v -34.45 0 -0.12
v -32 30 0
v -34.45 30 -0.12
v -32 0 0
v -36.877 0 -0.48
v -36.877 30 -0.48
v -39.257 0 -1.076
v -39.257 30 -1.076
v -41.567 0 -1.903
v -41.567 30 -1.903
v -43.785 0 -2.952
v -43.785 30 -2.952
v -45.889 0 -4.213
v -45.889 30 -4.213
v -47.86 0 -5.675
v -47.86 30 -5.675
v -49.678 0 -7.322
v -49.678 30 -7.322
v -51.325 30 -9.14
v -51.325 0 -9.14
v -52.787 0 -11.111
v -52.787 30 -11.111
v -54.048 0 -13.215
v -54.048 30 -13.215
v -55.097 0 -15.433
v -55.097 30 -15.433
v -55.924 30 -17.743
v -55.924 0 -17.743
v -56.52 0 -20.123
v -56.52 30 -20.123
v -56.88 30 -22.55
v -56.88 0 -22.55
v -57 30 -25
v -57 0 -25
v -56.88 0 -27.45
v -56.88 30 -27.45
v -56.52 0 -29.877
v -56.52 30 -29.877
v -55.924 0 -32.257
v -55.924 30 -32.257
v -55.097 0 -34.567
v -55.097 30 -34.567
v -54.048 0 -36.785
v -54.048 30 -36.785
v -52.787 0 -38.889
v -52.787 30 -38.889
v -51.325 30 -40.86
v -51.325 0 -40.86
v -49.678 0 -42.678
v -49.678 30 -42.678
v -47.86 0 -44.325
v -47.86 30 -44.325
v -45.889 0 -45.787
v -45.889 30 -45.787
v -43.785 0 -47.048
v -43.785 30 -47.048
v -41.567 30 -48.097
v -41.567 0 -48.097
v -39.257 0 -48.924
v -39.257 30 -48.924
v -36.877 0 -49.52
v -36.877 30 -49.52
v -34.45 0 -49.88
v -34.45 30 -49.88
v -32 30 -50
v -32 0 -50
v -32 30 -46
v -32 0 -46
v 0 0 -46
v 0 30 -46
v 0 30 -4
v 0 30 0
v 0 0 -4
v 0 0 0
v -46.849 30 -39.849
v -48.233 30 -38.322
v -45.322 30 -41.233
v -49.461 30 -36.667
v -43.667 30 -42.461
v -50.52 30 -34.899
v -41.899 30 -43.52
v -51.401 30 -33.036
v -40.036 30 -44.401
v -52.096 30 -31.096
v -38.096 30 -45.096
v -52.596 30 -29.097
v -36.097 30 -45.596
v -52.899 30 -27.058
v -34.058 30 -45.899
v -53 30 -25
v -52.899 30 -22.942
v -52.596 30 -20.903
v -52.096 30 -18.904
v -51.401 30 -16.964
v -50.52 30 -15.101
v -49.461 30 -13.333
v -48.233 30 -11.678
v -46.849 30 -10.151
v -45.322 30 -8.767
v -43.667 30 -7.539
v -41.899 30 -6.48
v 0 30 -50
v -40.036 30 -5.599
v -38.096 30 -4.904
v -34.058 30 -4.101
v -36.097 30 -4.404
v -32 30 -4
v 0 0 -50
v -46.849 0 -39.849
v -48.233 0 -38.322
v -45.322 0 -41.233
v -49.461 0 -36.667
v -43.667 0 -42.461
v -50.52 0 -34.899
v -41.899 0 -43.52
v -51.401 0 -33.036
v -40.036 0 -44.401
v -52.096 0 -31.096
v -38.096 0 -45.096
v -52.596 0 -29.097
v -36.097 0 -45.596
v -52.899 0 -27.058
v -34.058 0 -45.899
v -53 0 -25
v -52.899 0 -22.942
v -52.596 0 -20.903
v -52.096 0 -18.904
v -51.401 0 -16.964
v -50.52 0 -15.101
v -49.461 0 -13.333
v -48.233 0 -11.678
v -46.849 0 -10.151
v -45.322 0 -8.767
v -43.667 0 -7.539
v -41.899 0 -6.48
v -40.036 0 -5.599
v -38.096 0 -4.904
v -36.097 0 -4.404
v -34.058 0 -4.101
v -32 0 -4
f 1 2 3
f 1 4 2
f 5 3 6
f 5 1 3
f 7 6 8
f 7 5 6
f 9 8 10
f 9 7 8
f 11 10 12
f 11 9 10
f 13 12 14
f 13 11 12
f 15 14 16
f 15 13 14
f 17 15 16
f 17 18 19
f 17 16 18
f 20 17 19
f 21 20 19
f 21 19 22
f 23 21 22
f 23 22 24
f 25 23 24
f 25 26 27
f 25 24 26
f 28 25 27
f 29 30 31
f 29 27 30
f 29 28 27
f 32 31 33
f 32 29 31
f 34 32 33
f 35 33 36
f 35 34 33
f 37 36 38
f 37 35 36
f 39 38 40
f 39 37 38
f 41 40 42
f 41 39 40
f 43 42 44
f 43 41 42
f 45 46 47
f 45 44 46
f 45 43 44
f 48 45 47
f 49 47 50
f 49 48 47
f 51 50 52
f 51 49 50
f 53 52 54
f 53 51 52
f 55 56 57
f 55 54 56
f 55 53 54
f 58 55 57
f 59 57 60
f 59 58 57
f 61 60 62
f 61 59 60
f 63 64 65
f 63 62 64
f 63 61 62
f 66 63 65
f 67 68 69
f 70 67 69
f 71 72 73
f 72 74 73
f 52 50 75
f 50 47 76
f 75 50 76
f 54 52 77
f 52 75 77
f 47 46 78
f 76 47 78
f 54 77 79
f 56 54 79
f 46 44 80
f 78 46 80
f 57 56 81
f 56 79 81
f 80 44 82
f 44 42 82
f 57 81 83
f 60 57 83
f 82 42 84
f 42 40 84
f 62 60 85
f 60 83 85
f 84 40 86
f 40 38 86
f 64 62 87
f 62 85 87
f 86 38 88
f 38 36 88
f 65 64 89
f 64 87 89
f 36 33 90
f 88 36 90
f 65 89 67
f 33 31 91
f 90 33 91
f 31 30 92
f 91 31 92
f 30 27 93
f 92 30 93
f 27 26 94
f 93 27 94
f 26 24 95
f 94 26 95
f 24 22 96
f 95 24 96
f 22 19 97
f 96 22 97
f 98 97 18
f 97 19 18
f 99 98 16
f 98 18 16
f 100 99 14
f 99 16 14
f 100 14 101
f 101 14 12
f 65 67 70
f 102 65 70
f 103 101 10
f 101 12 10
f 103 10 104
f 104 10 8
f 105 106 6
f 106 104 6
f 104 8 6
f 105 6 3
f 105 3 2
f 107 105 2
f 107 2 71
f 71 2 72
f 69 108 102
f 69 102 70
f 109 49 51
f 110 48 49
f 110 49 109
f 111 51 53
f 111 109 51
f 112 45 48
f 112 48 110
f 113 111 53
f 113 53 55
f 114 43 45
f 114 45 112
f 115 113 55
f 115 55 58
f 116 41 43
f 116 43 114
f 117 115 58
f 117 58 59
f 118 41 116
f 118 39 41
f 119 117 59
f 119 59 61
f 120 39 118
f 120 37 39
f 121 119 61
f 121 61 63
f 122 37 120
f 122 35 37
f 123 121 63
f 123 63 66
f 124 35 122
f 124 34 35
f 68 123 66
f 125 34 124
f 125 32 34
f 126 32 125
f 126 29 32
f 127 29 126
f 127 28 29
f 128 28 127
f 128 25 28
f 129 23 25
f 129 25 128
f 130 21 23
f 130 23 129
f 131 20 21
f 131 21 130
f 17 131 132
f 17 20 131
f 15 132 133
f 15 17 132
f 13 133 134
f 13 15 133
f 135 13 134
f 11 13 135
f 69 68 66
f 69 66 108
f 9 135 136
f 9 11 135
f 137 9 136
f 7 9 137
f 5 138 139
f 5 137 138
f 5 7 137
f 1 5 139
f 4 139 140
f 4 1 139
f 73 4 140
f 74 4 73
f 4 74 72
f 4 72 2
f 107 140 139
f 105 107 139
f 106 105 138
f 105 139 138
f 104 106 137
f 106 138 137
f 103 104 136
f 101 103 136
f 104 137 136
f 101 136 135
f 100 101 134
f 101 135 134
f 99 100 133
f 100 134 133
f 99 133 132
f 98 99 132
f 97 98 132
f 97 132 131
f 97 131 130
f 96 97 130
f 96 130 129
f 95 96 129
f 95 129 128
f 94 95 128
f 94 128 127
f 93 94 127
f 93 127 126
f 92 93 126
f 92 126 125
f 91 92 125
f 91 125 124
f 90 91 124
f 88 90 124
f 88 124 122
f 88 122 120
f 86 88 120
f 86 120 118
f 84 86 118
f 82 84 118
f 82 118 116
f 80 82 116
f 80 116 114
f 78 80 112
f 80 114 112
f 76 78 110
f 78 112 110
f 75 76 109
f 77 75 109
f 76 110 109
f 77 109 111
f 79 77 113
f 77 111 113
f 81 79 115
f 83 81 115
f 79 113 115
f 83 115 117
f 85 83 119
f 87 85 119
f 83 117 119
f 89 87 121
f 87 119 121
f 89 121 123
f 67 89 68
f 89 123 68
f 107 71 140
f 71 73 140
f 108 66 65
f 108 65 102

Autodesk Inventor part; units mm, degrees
ref_plane "YZ Plane" through (0, 0, 0) normal (1, 0, 0) x (0, 1, 0)
ref_plane "XZ Plane" through (0, 0, 0) normal (0, 1, 0) x (-1, 0, 0)
ref_plane "XY Plane" through (0, 0, 0) normal (0, 0, 1) x (1, 0, 0)
sketch "Sketch1" plane through (0, 0, 0) normal (0, 1, 0) x (-1, 0, 0)
  line L0 (0, 0) -> (32, 0)
  arc A0 (32, -50) -> (32, 0) centre (32, -25) ccw
  line L1 (32, -50) -> (0, -50)
  dimension "d11" = 50
  dimension "d12" = 32
contour flange "Contour Flange1" sketch "Sketch1" thickness 4 bend radius 4 width 30 along (0, 1, 0) mid plane no both sides no wall seen from (-16, 0, 0) lies toward (0, 0, -1) curves L0 A0 L1
bend "Bend1"
corner "Corner1"
equation "\"d0\" = Thickness"
equation "\"d1\" = BendReliefWidth"
equation "\"d2\" = BendReliefDepth"
equation "\"d3\" = MinimumRemnant"
equation "\"d4\" = TransitionRadius"
equation "\"d6\" = BendRadius"
equation "\"d8\" = CornerReliefSize"
equation "\"d9\" = GapSize"
equation "\"d10\" = JacobiRadiusSize"
equation "\"BendRadius\" = Thickness"
equation "\"BendReliefWidth\" = Thickness"
equation "\"BendReliefDepth\" = 0.5 * Thickness"
equation "\"CornerReliefSize\" = 4 * Thickness"
equation "\"MinimumRemnant\" = 2 * Thickness"
equation "\"TransitionRadius\" = BendRadius"
equation "\"JacobiRadiusSize\" = BendRadius"
equation "\"GapSize\" = Thickness"
equation "\"Thickness\" = 4"
properties part number "bukket del" material "Steel"
